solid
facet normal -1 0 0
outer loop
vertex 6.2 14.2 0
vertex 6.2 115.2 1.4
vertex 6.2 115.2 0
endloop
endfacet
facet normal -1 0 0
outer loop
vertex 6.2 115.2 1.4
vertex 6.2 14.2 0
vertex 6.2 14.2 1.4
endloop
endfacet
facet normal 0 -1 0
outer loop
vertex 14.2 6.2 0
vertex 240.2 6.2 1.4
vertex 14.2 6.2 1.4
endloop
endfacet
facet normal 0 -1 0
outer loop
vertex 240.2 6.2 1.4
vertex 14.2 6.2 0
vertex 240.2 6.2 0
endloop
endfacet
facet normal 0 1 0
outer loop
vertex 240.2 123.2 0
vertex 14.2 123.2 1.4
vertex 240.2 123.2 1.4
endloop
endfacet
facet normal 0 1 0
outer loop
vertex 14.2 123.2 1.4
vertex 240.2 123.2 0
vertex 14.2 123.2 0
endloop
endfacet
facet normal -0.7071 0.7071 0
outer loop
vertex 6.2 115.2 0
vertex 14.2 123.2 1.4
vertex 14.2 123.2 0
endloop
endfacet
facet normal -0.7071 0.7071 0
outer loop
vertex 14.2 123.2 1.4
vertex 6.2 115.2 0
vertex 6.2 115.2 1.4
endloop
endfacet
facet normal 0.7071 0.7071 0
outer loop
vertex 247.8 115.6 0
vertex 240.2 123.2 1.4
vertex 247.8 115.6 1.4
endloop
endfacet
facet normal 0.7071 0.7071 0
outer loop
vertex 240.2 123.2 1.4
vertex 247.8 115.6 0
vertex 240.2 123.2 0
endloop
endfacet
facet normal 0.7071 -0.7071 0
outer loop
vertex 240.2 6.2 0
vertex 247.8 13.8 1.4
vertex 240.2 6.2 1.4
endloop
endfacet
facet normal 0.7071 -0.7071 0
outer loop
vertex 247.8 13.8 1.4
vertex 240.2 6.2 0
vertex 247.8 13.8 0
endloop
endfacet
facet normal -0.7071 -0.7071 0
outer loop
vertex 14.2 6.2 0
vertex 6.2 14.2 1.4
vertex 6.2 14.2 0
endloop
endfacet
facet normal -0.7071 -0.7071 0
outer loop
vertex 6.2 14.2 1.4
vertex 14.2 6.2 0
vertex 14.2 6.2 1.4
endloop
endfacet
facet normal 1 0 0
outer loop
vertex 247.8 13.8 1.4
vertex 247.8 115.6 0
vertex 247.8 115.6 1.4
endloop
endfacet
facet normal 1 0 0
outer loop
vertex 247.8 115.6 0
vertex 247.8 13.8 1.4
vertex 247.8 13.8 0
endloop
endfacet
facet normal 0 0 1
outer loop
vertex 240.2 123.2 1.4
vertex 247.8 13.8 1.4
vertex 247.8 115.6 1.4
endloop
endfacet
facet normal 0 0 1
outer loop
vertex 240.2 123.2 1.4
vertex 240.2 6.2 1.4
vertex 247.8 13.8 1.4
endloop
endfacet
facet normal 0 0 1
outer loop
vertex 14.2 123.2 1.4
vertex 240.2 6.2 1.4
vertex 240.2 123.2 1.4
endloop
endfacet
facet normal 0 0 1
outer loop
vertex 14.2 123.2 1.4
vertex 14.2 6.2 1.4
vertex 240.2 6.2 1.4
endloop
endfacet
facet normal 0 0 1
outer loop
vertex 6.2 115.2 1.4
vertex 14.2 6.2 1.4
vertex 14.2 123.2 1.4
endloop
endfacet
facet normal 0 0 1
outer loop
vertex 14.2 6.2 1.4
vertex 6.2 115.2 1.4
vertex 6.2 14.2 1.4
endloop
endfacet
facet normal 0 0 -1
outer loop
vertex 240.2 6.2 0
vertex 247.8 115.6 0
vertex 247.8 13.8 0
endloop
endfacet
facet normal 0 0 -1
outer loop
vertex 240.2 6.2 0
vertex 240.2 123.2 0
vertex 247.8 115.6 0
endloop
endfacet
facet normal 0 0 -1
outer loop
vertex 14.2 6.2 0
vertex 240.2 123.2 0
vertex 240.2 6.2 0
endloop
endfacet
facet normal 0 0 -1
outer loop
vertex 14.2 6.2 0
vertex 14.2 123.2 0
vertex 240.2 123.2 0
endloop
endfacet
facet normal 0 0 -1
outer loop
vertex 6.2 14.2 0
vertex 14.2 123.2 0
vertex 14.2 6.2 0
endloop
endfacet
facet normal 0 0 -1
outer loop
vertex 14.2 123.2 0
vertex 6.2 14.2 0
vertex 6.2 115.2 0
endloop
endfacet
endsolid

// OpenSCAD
// file: triangles.scad
/**
 * Simple triangles library
 *
 * Authors:
 *   - Eero 'rambo' af Heurlin 2010-
 *
 * License: LGPL 2.1
 */


/**
 * Standard right-angled triangle
 *
 * @param number  o_len  Length of the opposite side
 * @param number  a_len  Length of the adjacent side
 * @param number  depth  How wide/deep the triangle is in the 3rd dimension
 * @param boolean center Whether to center the triangle on the origin
 * @todo a better way ?
 */
module triangle(o_len, a_len, depth, center=false)
{
    centroid = center ? [-a_len/3, -o_len/3, -depth/2] : [0, 0, 0];
    translate(centroid) linear_extrude(height=depth)
    {
        polygon(points=[[0,0],[a_len,0],[0,o_len]], paths=[[0,1,2]]);
    }
}

/**
 * Standard right-angled triangle (tangent version)
 *
 * @param number  tan_angle Angle of adjacent to hypotenuse (ie tangent)
 * @param number  a_len     Length of the adjacent side
 * @param number  depth     How wide/deep the triangle is in the 3rd dimension
 * @param boolean center    Whether to center the triangle on the origin
 */
module a_triangle(tan_angle, a_len, depth, center=false)
{
    triangle(tan(tan_angle) * a_len, a_len, depth, center);
}

// Tests:
module test_triangle() { triangle(5, 5, 5); }
module test_a_triangle() { a_triangle(45, 5, 5); }
module test_triangles()
{
    // Generate a bunch of triangles by sizes
    for (i = [1:10])
    {
        translate([i*7, -30, i*7])
        {
            triangle(i*5, sqrt(i*5+pow(i,2)), 5);
        }
    }

    // Generate a bunch of triangles by angle
    for (i = [1:85/5])
    {
        translate([i*7, 22, i*7])
        {
            a_triangle(i*5, 10, 5);
        }
    }
}
// main file
/*difference() {
  square([250, 125]);
  
}*/

use <triangles.scad>;

outer_x = 250;
outer_y = 125;
outer_z = 50;

wall_thickness = 2;

module corner_with_screwhole(height) {
  difference() {
    triangle(12, 12, height);
    translate([3.5, 3.5, height-10]) cylinder(11, d=2.2, $fn=20);
  }
}

module standoff() {  
  difference() {
    cylinder(7, d=5, $fn=50);
    cylinder(8, d=2.2, $fn=50);
  }
}

module front() {
  difference() {
    // basic shape
    cube([outer_x, outer_y, outer_z]);
    translate([wall_thickness*2, wall_thickness*2, wall_thickness])
      cube([outer_x-4*wall_thickness, outer_y-4*wall_thickness, 16]);
    translate([wall_thickness, wall_thickness, wall_thickness+15])
      cube([outer_x-2*wall_thickness, outer_y-2*wall_thickness, outer_z]);
    
    // tilted edges
    translate([-1, -3, -9]) rotate([45, 0, 0]) cube([outer_x+2, 10, 10]);
    translate([-1, outer_y+3, -9]) rotate([45, 0, 0]) cube([outer_x+2, 10, 10]);
    translate([-9, -1, -3]) rotate([0, 45, 0]) cube([10, outer_y+2, 10]);
    translate([outer_x-5, -1, -3]) rotate([0, 45, 0]) cube([10, outer_y+2, 10]);
    
    // text cut-out
    translate([outer_x-5.5, 35, wall_thickness+1]) rotate([0, 180, 0]) linear_extrude(wall_thickness+2) text("ON AIR", size=52, font="Stencilia\\-A:style=Regular");
    
    // power connector socket
    translate([outer_x/2, wall_thickness+1, outer_z-6.4-3*wall_thickness]) rotate([90, 0, 0]) cylinder(10, d=12.8);
    
    // microusb socket
    translate([outer_x-wall_thickness-1, outer_y/2-6, outer_z-2*wall_thickness-17]) cube([10, 12, 7]);
  }

  // corners to attach back wall to
  translate([wall_thickness, wall_thickness, wall_thickness])
    corner_with_screwhole(outer_z-2*wall_thickness);
  translate([outer_x-wall_thickness, wall_thickness, wall_thickness])
    rotate([0, 0, 90]) corner_with_screwhole(outer_z-2*wall_thickness);
  translate([outer_x-wall_thickness, outer_y-wall_thickness, wall_thickness])
    rotate([0, 0, 180]) corner_with_screwhole(outer_z-2*wall_thickness);
  translate([wall_thickness, outer_y-wall_thickness, wall_thickness])
    rotate([0, 0, 270]) corner_with_screwhole(outer_z-2*wall_thickness);
}

module back() {
  difference() {
    // basic shape
    union() {
      cube([outer_x, outer_y, wall_thickness]);
      translate([wall_thickness+0.2, wall_thickness+0.2, 0])
        cube([outer_x-2*wall_thickness-0.4, outer_y-2*wall_thickness-0.4, 2*wall_thickness]);
    }
    // screw holes
    translate([wall_thickness+3.5, wall_thickness+3.5, -1]) {
      cylinder(2*wall_thickness+2, d=3, $fn=20);
      cylinder(2+1, d=5.8, $fn=50);
    }
    translate([outer_x-wall_thickness-3.5, wall_thickness+3.5, -1]) {
      cylinder(2*wall_thickness+2, d=3, $fn=20);
      cylinder(2+1, d=5.8, $fn=50);
    }
    translate([outer_x-wall_thickness-3.5, outer_y-wall_thickness-3.5, -1]) {
      cylinder(2*wall_thickness+2, d=3, $fn=20);
      cylinder(2+1, d=5.8, $fn=50);
    }
    translate([wall_thickness+3.5, outer_y-wall_thickness-3.5, -1]) {
      cylinder(2*wall_thickness+2, d=3, $fn=20);
      cylinder(2+1, d=5.8, $fn=50);
    }
    
    // wall mount
    translate([(outer_x-17)/2, outer_y-45, -1]) {
      cube([17, 38, wall_thickness*1.5+1]);
      translate([(17-6)/2, 0, 0]) cube([6, 11, wall_thickness*2+2]);
    }
    translate([40, outer_y-20, -1]) cylinder(2*wall_thickness+2, d=4);
    translate([outer_x-40, outer_y-20, -1]) cylinder(2*wall_thickness+2, d=4);
  }
  // REMOVE BEFORE FLIGHT
  //translate([wall_thickness, (outer_y-55)/2, 2*wall_thickness]) cube([85, 55, 1]);
  
  // MOSFET standoffs
  translate([110, outer_y/2, 2*wall_thickness]) standoff();
  translate([139, outer_y/2, 2*wall_thickness]) standoff();
  
  // RPI standoffs
  translate([175, (outer_y-49)/2, 2*wall_thickness]) standoff();
  translate([175+58, (outer_y-49)/2, 2*wall_thickness]) standoff();
  translate([175, (outer_y-49)/2+49, 2*wall_thickness]) standoff();
  translate([175+58, (outer_y-49)/2+49, 2*wall_thickness]) standoff();
}

module reflection_screen() {
  difference() {
    cube([outer_x-2*wall_thickness-0.4, outer_y-wall_thickness-0.4, 1.4]);
    translate([0, outer_y, wall_thickness+5]) rotate([180, 0, 0]) front();
  }
}

//front();
//back();
translate([wall_thickness+0.2, wall_thickness+0.2, 0]) reflection_screen();
